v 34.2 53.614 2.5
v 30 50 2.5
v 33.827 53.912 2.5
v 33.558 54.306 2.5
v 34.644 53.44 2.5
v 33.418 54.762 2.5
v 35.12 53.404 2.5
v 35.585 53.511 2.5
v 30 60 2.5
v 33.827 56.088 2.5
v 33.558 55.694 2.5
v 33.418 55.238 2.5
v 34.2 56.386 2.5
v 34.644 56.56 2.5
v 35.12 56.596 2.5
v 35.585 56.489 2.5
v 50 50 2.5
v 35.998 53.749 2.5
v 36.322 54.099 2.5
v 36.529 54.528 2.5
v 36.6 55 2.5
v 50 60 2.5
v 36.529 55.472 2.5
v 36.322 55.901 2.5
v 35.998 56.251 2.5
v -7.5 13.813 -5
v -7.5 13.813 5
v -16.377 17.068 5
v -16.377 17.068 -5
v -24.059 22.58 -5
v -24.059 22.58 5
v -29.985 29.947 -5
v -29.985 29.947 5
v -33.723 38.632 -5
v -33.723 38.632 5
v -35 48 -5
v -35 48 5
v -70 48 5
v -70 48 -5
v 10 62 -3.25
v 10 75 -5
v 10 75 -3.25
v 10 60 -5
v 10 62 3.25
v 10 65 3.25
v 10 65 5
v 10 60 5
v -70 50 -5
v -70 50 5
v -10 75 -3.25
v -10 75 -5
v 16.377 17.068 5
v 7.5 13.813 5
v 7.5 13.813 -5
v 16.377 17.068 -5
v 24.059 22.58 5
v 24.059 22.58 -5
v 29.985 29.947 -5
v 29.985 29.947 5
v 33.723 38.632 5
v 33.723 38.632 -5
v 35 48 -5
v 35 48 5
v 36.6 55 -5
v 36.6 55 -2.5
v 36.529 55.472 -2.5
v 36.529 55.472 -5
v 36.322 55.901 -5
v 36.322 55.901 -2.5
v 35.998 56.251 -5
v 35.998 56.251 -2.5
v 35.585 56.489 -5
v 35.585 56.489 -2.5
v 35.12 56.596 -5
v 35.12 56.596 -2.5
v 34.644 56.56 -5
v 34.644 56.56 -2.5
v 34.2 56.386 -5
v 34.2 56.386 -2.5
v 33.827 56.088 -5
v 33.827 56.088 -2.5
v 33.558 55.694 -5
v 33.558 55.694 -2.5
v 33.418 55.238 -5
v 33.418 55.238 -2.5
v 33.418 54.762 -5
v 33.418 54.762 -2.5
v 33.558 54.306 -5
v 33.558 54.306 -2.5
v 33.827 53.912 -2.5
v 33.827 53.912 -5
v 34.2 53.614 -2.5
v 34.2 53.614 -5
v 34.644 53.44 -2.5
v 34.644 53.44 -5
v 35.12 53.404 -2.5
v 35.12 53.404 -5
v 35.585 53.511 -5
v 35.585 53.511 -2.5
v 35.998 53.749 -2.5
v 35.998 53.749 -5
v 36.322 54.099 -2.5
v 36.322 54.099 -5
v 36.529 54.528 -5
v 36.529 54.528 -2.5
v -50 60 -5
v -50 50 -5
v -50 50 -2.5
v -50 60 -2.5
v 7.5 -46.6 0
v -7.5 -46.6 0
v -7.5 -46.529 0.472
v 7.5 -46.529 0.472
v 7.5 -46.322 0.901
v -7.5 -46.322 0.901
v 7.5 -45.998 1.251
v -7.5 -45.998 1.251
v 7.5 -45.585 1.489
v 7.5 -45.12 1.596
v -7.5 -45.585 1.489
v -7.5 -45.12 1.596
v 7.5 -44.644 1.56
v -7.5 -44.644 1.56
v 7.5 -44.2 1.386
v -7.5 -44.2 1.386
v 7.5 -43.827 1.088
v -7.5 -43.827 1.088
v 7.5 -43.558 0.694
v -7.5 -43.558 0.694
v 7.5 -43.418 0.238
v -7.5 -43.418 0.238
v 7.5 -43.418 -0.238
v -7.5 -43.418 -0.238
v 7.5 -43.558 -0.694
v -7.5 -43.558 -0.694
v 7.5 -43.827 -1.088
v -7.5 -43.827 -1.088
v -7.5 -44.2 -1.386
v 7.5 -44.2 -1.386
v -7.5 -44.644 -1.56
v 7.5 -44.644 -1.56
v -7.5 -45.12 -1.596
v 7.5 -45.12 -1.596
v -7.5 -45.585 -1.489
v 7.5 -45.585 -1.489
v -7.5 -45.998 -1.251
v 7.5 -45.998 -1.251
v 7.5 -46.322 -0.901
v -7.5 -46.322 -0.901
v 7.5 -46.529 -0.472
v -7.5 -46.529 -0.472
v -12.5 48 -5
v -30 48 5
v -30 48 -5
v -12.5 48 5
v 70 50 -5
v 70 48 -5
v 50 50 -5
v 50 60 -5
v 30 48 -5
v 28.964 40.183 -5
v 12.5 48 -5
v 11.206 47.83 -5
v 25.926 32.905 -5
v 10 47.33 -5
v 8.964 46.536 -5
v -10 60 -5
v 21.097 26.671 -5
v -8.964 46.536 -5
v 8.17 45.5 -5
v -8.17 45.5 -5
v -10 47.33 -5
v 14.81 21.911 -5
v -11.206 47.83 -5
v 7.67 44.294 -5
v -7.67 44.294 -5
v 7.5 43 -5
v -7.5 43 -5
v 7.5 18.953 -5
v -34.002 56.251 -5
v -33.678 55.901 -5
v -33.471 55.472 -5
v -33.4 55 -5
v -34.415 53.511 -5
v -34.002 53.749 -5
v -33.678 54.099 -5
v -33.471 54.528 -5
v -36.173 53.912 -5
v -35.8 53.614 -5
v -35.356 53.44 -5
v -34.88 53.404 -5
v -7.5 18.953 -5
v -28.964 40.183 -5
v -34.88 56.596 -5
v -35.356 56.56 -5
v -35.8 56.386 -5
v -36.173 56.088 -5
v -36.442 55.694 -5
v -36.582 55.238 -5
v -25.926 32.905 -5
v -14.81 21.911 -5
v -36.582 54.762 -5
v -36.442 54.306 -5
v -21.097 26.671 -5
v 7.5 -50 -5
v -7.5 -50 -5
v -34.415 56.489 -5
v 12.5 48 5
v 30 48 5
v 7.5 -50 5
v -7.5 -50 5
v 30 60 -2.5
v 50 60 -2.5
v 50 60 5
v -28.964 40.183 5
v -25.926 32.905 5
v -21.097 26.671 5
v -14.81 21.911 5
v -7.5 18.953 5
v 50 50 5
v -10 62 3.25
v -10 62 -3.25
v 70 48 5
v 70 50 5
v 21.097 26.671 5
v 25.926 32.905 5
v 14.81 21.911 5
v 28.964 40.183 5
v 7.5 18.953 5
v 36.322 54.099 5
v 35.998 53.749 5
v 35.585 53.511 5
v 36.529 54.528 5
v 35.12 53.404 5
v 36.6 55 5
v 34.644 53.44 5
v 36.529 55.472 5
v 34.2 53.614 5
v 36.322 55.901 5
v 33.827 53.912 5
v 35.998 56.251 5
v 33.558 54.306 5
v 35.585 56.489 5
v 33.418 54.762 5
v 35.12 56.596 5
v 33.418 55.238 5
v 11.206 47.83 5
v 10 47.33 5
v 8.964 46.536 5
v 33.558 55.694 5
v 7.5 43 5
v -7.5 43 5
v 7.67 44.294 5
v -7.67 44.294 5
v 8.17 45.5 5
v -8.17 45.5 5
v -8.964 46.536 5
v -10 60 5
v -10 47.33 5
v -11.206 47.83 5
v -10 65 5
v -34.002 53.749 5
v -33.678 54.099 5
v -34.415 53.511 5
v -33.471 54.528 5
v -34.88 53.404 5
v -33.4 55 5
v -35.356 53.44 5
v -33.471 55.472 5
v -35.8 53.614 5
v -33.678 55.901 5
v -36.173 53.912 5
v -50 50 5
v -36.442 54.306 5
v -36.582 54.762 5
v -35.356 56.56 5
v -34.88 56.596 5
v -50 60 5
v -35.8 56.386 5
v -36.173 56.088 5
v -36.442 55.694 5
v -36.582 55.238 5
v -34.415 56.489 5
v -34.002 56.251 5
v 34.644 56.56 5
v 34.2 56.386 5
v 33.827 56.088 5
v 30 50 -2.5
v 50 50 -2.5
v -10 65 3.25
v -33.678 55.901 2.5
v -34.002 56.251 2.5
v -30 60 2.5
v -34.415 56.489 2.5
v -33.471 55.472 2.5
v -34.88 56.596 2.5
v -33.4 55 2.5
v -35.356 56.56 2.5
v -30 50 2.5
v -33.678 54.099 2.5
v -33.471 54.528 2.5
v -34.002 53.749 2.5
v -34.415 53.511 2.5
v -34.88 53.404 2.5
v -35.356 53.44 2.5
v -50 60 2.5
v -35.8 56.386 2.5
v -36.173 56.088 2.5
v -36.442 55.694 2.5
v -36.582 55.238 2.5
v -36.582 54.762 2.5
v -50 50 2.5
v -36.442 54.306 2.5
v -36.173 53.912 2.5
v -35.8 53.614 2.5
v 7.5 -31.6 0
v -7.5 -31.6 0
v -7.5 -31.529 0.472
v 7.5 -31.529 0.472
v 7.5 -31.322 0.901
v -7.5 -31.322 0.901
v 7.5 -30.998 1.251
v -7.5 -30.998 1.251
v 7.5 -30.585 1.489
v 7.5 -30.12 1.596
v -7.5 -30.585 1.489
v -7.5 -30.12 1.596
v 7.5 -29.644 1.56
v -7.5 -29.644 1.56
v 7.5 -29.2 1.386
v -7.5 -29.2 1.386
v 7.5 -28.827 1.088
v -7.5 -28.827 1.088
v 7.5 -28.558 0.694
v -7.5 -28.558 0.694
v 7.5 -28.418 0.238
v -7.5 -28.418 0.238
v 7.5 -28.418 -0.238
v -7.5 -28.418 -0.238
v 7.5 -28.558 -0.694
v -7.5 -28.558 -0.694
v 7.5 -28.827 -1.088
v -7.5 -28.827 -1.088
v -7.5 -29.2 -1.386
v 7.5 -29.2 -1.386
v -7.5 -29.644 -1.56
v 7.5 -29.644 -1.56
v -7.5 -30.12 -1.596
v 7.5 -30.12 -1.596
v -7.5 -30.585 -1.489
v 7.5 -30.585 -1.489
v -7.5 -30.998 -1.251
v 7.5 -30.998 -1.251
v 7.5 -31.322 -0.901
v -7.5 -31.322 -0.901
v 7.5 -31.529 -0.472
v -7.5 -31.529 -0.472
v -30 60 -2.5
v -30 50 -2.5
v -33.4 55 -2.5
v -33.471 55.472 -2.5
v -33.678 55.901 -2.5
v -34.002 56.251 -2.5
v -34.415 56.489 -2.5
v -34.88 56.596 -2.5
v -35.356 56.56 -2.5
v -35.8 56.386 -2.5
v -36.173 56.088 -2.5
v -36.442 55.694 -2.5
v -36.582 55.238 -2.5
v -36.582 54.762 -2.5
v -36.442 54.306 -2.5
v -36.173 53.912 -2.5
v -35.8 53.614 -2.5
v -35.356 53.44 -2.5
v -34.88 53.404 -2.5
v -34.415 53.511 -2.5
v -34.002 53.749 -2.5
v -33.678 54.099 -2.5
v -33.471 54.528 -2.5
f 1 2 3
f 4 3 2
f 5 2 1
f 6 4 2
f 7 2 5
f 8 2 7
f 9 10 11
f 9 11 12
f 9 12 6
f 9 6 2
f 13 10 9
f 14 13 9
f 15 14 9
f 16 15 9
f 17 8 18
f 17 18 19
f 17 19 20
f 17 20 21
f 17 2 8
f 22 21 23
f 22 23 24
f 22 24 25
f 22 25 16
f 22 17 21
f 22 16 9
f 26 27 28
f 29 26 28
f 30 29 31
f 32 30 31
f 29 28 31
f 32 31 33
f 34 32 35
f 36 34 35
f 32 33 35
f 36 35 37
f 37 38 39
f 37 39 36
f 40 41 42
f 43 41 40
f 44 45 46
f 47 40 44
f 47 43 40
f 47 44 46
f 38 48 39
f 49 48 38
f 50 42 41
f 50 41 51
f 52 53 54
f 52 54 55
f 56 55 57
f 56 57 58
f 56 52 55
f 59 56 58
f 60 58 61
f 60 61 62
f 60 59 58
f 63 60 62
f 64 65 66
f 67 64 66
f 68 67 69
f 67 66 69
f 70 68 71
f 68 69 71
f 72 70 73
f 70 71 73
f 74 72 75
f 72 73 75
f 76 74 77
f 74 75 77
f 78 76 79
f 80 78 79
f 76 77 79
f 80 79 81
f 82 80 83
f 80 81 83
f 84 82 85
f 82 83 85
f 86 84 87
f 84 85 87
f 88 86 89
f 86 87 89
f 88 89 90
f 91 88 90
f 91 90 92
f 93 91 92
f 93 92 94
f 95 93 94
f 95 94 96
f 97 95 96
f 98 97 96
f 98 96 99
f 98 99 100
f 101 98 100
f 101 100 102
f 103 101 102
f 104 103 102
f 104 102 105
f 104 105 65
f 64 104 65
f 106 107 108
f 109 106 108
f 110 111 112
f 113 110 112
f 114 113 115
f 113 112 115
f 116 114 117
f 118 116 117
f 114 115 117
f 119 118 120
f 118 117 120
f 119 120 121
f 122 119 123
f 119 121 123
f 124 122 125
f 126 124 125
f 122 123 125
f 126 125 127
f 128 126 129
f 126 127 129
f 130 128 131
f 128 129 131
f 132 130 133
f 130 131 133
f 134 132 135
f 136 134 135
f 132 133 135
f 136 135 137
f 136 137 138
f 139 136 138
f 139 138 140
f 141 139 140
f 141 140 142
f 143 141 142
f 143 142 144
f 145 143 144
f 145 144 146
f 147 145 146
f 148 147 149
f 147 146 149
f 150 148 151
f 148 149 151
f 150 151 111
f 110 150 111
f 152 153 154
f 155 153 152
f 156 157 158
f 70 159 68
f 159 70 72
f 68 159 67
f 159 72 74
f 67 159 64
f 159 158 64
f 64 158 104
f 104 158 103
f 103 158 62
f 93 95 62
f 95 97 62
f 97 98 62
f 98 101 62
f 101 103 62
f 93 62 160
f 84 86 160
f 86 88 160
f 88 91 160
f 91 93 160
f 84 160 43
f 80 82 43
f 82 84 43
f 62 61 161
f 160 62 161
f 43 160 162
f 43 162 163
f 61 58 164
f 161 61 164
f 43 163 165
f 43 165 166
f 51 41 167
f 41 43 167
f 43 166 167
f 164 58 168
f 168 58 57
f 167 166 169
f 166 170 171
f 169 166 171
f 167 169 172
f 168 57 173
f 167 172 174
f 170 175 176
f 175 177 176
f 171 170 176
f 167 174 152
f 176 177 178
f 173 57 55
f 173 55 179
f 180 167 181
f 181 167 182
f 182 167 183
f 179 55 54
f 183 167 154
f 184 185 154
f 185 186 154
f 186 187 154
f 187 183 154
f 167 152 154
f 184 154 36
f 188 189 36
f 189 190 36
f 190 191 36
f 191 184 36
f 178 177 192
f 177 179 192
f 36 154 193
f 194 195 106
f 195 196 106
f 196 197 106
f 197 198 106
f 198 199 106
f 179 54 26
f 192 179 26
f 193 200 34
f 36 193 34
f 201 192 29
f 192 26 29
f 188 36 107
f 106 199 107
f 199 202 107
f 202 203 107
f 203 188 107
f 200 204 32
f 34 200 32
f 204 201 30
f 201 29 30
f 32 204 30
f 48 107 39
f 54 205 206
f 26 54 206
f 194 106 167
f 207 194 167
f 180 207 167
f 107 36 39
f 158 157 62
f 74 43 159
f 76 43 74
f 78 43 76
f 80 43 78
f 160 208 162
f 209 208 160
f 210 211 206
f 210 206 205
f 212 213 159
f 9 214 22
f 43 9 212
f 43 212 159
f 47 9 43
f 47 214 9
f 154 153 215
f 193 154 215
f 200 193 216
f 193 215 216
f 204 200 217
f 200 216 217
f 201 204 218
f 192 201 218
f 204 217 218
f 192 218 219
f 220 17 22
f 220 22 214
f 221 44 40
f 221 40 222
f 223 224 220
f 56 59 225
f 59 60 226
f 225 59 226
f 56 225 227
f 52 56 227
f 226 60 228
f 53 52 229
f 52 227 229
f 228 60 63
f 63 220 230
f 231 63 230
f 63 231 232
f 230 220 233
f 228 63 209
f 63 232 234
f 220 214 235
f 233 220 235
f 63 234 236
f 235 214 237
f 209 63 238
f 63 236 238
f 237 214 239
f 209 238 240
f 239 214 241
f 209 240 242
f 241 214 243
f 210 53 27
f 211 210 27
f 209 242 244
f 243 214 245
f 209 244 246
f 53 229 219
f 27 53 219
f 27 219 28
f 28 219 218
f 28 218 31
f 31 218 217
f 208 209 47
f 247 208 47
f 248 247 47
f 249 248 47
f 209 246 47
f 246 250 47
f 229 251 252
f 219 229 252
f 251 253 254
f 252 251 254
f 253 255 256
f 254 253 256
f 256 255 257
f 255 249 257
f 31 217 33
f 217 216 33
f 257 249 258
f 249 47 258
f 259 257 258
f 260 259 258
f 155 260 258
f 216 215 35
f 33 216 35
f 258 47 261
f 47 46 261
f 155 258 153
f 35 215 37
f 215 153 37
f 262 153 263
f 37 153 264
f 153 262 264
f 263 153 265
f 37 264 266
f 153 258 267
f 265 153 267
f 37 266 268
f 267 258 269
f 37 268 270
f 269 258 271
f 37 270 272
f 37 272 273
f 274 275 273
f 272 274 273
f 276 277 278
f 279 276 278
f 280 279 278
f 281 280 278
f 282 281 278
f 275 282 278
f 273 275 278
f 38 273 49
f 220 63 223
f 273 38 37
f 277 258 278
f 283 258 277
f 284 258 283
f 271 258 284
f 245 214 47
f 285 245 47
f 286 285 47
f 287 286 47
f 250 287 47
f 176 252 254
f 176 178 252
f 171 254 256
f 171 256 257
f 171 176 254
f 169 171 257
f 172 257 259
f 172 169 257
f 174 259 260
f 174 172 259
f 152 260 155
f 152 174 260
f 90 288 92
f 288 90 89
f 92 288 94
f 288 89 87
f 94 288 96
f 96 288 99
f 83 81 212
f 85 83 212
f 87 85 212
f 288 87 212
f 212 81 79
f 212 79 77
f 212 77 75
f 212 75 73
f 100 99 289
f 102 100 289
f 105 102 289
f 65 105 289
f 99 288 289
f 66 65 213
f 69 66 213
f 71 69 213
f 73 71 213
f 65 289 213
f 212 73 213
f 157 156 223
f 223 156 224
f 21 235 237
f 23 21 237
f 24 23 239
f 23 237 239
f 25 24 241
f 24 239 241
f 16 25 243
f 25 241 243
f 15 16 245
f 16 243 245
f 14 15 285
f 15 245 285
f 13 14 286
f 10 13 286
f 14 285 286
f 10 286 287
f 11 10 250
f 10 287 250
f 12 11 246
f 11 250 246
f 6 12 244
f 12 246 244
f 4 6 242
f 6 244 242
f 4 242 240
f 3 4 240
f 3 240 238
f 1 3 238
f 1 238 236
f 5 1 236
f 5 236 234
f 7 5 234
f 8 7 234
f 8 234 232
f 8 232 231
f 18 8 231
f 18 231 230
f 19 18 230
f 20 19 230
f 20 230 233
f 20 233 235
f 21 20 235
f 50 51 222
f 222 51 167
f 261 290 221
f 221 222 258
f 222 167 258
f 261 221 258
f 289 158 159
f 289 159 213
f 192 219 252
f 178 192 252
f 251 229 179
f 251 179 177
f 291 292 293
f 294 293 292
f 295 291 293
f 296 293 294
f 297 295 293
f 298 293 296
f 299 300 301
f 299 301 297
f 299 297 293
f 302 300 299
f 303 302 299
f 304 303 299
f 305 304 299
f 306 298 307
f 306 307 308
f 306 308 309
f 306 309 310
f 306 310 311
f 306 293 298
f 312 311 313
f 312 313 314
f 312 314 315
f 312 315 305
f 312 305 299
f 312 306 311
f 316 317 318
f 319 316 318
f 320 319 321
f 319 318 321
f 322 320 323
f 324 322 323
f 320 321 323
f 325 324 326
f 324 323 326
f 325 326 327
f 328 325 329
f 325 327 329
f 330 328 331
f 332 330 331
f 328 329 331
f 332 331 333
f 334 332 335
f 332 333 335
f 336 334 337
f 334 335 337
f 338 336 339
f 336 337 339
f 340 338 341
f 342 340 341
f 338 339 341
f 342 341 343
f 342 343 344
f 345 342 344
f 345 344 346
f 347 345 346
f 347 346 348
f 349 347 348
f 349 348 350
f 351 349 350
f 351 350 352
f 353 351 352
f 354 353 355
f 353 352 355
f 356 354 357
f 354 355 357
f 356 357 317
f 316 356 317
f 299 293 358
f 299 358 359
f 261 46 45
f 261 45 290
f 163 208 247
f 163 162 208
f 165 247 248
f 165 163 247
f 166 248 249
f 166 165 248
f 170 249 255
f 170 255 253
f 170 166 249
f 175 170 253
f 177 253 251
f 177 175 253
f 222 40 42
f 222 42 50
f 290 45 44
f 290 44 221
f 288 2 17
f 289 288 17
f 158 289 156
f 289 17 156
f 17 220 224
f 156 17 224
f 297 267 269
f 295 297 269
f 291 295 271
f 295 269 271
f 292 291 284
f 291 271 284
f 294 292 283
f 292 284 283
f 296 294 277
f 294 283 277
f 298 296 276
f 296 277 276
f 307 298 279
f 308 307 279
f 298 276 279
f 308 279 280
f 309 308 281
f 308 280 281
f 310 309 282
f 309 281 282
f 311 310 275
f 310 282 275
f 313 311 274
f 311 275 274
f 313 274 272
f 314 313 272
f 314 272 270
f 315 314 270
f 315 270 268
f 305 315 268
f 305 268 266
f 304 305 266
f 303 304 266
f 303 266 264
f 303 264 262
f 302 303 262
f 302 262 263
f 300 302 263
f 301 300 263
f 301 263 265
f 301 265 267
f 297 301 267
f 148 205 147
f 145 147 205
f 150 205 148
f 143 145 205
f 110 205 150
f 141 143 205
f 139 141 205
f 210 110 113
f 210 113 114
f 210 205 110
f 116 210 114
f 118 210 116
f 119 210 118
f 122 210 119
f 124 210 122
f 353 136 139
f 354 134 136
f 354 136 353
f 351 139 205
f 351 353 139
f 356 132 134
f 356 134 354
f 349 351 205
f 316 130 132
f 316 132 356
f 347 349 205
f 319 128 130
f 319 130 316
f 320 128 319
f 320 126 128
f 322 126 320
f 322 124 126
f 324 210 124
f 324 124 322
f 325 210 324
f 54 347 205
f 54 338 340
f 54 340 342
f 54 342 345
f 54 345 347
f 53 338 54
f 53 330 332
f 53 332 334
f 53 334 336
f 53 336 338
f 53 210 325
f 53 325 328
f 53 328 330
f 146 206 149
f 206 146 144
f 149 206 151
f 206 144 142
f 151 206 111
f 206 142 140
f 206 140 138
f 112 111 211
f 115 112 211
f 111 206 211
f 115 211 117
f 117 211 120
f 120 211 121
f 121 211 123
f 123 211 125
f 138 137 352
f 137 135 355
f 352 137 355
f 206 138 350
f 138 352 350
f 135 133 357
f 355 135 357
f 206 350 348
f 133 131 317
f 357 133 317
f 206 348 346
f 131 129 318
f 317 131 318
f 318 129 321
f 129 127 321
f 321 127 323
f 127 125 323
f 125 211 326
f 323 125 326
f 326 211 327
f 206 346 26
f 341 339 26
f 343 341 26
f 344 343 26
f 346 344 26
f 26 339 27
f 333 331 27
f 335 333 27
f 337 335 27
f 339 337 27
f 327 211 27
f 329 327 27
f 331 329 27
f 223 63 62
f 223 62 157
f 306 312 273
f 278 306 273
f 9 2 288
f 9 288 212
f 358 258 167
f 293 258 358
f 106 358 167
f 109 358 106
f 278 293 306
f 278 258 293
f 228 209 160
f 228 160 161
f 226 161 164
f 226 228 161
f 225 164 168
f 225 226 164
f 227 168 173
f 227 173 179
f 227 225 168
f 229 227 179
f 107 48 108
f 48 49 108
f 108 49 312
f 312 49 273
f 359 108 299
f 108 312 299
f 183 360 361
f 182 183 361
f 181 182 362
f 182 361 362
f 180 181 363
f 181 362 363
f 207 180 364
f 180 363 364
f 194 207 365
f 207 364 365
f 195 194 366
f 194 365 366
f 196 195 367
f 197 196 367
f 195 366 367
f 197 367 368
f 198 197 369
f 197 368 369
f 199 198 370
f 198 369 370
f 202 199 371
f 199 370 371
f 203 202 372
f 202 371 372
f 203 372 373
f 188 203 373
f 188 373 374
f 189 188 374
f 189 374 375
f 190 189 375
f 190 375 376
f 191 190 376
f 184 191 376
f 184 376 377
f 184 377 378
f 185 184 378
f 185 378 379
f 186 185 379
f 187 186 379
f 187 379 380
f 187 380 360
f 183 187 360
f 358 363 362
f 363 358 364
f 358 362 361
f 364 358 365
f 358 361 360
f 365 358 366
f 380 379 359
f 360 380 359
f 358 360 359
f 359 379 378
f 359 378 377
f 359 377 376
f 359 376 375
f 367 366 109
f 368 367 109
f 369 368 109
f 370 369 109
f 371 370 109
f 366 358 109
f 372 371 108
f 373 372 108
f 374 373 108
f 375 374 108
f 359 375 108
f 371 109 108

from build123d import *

# Parameters (mm, degrees)
F0_W      = 15
F0_H      = 100
F1_DEPTH  = 5
F2_W      = 100
F2_H      = 10
F3_DEPTH  = 10
F4_W      = 10
F4_H      = 5
F5_DEPTH  = 20
F6_W      = 10
F6_H      = 5
F7_DEPTH  = 20
F8_R      = 1.6
F9_DEPTH  = 10
F10_W     = 77.5
F10_H     = 10
F10_W_2   = 140
F11_DEPTH = 2
F12_R     = 5
F13_R     = 1.6
F14_DEPTH = 15
F15_W     = 20
F15_H     = 10
F16_DEPTH = 5
F17_W     = 20
F17_H     = 6.5
F18_DEPTH = 3
F19_DEPTH = 10
F21_DEPTH = 10


# Not quite as in the source:
# - a pattern or mirror of a feature is missing from the dataset's text; its kind, count and spacing are read off the source's solid


with BuildPart() as f1:
    # F0 (on Top) → F1 (new body, symmetric)
    with BuildSketch(Plane.XY):
        Rectangle(F0_W, F0_H)
    extrude(amount=F1_DEPTH, both=True)

    # F2 (on face) → F3 (join)
    with BuildSketch(Plane(origin=(0, 50, 0), x_dir=(-1, 0, 0), z_dir=(0, 1, 0))):
        Rectangle(F2_W, F2_H)
    extrude(amount=F3_DEPTH)

    # F4 (on face) → F5 (cut)
    with BuildSketch(Plane(origin=(-50, 0, 0), x_dir=(0, -1, 0), z_dir=(-1, 0, 0))):
        with Locations((-55, 0)):
            Rectangle(F4_W, F4_H)
    extrude(amount=-F5_DEPTH, mode=Mode.SUBTRACT)

    # F6 (on face) → F7 (cut)
    with BuildSketch(Plane.YZ.offset(50)):
        with Locations((55, 0)):
            Rectangle(F6_W, F6_H)
    extrude(amount=-F7_DEPTH, mode=Mode.SUBTRACT)

    # F8 (on face) → F9 (cut, through all)
    with BuildSketch(Plane.XY.offset(5)):
        with Locations((-35, 55)):
            Circle(F8_R)
        with Locations((35, 55)):
            Circle(F8_R)
    extrude(amount=-F9_DEPTH, mode=Mode.SUBTRACT)

    # F10 (on face) → F11 (join)
    with BuildSketch(Plane.XZ.offset(-50)):
        with Locations((31.25, 0)):
            Rectangle(F10_W, F10_H)
        Rectangle(F10_W_2, F10_H)
    extrude(amount=F11_DEPTH)

    # F12
    f12_edges = [f1.edges().sort_by_distance(p)[0] for p in [
        (-7.5, 48, 0),
        (7.5, 48, 0),
    ]]
    fillet(f12_edges, radius=F12_R)

    # F13 (on face) → F14 (cut, through all)
    with BuildSketch(Plane(origin=(-7.5, 0, 0), x_dir=(0, -1, 0), z_dir=(-1, 0, 0))):
        with Locations((30, 0)):
            Circle(F13_R)
        with Locations((45, 0)):
            Circle(F13_R)
    extrude(amount=-F14_DEPTH, mode=Mode.SUBTRACT)

    # F15 (on face) → F16 (join)
    with BuildSketch(Plane(origin=(0, 60, 0), x_dir=(-1, 0, 0), z_dir=(0, 1, 0))):
        Rectangle(F15_W, F15_H)
    extrude(amount=F16_DEPTH)

    # F17 (on face) → F18 (cut)
    with BuildSketch(Plane(origin=(0, 65, 0), x_dir=(-1, 0, 0), z_dir=(0, 1, 0))):
        Rectangle(F17_W, F17_H)
    extrude(amount=-F18_DEPTH, mode=Mode.SUBTRACT)

    # F19 (add): a face of the model
    f19_faces = [f1.faces().sort_by_distance(p)[0] for p in [
        (0, 65, -4.125),
    ]]
    extrude(f19_faces, amount=F19_DEPTH)

    # F20 (on face) → F21 (join, through all)
    with BuildSketch(Plane.XY.offset(5)):
        with BuildLine():
            Line((35, 48), (30, 48))
            ThreePointArc((30, 48), (23.7170824513, 29.6288269291), (7.5, 18.9526249034))
            Line((7.5, 18.9526249034), (7.5, 13.8130141721))
            ThreePointArc((7.5, 13.8130141721), (27.2717802866, 26.0625890315), (35, 48))
        make_face()
    f21 = extrude(amount=-F21_DEPTH)

    # F21_copies: F21 across plane
    add(f21.mirror(Plane(origin=(0, 0, 0), x_dir=(0, 0, -1), z_dir=(-1, 0, 0))))


solid = f1.part
